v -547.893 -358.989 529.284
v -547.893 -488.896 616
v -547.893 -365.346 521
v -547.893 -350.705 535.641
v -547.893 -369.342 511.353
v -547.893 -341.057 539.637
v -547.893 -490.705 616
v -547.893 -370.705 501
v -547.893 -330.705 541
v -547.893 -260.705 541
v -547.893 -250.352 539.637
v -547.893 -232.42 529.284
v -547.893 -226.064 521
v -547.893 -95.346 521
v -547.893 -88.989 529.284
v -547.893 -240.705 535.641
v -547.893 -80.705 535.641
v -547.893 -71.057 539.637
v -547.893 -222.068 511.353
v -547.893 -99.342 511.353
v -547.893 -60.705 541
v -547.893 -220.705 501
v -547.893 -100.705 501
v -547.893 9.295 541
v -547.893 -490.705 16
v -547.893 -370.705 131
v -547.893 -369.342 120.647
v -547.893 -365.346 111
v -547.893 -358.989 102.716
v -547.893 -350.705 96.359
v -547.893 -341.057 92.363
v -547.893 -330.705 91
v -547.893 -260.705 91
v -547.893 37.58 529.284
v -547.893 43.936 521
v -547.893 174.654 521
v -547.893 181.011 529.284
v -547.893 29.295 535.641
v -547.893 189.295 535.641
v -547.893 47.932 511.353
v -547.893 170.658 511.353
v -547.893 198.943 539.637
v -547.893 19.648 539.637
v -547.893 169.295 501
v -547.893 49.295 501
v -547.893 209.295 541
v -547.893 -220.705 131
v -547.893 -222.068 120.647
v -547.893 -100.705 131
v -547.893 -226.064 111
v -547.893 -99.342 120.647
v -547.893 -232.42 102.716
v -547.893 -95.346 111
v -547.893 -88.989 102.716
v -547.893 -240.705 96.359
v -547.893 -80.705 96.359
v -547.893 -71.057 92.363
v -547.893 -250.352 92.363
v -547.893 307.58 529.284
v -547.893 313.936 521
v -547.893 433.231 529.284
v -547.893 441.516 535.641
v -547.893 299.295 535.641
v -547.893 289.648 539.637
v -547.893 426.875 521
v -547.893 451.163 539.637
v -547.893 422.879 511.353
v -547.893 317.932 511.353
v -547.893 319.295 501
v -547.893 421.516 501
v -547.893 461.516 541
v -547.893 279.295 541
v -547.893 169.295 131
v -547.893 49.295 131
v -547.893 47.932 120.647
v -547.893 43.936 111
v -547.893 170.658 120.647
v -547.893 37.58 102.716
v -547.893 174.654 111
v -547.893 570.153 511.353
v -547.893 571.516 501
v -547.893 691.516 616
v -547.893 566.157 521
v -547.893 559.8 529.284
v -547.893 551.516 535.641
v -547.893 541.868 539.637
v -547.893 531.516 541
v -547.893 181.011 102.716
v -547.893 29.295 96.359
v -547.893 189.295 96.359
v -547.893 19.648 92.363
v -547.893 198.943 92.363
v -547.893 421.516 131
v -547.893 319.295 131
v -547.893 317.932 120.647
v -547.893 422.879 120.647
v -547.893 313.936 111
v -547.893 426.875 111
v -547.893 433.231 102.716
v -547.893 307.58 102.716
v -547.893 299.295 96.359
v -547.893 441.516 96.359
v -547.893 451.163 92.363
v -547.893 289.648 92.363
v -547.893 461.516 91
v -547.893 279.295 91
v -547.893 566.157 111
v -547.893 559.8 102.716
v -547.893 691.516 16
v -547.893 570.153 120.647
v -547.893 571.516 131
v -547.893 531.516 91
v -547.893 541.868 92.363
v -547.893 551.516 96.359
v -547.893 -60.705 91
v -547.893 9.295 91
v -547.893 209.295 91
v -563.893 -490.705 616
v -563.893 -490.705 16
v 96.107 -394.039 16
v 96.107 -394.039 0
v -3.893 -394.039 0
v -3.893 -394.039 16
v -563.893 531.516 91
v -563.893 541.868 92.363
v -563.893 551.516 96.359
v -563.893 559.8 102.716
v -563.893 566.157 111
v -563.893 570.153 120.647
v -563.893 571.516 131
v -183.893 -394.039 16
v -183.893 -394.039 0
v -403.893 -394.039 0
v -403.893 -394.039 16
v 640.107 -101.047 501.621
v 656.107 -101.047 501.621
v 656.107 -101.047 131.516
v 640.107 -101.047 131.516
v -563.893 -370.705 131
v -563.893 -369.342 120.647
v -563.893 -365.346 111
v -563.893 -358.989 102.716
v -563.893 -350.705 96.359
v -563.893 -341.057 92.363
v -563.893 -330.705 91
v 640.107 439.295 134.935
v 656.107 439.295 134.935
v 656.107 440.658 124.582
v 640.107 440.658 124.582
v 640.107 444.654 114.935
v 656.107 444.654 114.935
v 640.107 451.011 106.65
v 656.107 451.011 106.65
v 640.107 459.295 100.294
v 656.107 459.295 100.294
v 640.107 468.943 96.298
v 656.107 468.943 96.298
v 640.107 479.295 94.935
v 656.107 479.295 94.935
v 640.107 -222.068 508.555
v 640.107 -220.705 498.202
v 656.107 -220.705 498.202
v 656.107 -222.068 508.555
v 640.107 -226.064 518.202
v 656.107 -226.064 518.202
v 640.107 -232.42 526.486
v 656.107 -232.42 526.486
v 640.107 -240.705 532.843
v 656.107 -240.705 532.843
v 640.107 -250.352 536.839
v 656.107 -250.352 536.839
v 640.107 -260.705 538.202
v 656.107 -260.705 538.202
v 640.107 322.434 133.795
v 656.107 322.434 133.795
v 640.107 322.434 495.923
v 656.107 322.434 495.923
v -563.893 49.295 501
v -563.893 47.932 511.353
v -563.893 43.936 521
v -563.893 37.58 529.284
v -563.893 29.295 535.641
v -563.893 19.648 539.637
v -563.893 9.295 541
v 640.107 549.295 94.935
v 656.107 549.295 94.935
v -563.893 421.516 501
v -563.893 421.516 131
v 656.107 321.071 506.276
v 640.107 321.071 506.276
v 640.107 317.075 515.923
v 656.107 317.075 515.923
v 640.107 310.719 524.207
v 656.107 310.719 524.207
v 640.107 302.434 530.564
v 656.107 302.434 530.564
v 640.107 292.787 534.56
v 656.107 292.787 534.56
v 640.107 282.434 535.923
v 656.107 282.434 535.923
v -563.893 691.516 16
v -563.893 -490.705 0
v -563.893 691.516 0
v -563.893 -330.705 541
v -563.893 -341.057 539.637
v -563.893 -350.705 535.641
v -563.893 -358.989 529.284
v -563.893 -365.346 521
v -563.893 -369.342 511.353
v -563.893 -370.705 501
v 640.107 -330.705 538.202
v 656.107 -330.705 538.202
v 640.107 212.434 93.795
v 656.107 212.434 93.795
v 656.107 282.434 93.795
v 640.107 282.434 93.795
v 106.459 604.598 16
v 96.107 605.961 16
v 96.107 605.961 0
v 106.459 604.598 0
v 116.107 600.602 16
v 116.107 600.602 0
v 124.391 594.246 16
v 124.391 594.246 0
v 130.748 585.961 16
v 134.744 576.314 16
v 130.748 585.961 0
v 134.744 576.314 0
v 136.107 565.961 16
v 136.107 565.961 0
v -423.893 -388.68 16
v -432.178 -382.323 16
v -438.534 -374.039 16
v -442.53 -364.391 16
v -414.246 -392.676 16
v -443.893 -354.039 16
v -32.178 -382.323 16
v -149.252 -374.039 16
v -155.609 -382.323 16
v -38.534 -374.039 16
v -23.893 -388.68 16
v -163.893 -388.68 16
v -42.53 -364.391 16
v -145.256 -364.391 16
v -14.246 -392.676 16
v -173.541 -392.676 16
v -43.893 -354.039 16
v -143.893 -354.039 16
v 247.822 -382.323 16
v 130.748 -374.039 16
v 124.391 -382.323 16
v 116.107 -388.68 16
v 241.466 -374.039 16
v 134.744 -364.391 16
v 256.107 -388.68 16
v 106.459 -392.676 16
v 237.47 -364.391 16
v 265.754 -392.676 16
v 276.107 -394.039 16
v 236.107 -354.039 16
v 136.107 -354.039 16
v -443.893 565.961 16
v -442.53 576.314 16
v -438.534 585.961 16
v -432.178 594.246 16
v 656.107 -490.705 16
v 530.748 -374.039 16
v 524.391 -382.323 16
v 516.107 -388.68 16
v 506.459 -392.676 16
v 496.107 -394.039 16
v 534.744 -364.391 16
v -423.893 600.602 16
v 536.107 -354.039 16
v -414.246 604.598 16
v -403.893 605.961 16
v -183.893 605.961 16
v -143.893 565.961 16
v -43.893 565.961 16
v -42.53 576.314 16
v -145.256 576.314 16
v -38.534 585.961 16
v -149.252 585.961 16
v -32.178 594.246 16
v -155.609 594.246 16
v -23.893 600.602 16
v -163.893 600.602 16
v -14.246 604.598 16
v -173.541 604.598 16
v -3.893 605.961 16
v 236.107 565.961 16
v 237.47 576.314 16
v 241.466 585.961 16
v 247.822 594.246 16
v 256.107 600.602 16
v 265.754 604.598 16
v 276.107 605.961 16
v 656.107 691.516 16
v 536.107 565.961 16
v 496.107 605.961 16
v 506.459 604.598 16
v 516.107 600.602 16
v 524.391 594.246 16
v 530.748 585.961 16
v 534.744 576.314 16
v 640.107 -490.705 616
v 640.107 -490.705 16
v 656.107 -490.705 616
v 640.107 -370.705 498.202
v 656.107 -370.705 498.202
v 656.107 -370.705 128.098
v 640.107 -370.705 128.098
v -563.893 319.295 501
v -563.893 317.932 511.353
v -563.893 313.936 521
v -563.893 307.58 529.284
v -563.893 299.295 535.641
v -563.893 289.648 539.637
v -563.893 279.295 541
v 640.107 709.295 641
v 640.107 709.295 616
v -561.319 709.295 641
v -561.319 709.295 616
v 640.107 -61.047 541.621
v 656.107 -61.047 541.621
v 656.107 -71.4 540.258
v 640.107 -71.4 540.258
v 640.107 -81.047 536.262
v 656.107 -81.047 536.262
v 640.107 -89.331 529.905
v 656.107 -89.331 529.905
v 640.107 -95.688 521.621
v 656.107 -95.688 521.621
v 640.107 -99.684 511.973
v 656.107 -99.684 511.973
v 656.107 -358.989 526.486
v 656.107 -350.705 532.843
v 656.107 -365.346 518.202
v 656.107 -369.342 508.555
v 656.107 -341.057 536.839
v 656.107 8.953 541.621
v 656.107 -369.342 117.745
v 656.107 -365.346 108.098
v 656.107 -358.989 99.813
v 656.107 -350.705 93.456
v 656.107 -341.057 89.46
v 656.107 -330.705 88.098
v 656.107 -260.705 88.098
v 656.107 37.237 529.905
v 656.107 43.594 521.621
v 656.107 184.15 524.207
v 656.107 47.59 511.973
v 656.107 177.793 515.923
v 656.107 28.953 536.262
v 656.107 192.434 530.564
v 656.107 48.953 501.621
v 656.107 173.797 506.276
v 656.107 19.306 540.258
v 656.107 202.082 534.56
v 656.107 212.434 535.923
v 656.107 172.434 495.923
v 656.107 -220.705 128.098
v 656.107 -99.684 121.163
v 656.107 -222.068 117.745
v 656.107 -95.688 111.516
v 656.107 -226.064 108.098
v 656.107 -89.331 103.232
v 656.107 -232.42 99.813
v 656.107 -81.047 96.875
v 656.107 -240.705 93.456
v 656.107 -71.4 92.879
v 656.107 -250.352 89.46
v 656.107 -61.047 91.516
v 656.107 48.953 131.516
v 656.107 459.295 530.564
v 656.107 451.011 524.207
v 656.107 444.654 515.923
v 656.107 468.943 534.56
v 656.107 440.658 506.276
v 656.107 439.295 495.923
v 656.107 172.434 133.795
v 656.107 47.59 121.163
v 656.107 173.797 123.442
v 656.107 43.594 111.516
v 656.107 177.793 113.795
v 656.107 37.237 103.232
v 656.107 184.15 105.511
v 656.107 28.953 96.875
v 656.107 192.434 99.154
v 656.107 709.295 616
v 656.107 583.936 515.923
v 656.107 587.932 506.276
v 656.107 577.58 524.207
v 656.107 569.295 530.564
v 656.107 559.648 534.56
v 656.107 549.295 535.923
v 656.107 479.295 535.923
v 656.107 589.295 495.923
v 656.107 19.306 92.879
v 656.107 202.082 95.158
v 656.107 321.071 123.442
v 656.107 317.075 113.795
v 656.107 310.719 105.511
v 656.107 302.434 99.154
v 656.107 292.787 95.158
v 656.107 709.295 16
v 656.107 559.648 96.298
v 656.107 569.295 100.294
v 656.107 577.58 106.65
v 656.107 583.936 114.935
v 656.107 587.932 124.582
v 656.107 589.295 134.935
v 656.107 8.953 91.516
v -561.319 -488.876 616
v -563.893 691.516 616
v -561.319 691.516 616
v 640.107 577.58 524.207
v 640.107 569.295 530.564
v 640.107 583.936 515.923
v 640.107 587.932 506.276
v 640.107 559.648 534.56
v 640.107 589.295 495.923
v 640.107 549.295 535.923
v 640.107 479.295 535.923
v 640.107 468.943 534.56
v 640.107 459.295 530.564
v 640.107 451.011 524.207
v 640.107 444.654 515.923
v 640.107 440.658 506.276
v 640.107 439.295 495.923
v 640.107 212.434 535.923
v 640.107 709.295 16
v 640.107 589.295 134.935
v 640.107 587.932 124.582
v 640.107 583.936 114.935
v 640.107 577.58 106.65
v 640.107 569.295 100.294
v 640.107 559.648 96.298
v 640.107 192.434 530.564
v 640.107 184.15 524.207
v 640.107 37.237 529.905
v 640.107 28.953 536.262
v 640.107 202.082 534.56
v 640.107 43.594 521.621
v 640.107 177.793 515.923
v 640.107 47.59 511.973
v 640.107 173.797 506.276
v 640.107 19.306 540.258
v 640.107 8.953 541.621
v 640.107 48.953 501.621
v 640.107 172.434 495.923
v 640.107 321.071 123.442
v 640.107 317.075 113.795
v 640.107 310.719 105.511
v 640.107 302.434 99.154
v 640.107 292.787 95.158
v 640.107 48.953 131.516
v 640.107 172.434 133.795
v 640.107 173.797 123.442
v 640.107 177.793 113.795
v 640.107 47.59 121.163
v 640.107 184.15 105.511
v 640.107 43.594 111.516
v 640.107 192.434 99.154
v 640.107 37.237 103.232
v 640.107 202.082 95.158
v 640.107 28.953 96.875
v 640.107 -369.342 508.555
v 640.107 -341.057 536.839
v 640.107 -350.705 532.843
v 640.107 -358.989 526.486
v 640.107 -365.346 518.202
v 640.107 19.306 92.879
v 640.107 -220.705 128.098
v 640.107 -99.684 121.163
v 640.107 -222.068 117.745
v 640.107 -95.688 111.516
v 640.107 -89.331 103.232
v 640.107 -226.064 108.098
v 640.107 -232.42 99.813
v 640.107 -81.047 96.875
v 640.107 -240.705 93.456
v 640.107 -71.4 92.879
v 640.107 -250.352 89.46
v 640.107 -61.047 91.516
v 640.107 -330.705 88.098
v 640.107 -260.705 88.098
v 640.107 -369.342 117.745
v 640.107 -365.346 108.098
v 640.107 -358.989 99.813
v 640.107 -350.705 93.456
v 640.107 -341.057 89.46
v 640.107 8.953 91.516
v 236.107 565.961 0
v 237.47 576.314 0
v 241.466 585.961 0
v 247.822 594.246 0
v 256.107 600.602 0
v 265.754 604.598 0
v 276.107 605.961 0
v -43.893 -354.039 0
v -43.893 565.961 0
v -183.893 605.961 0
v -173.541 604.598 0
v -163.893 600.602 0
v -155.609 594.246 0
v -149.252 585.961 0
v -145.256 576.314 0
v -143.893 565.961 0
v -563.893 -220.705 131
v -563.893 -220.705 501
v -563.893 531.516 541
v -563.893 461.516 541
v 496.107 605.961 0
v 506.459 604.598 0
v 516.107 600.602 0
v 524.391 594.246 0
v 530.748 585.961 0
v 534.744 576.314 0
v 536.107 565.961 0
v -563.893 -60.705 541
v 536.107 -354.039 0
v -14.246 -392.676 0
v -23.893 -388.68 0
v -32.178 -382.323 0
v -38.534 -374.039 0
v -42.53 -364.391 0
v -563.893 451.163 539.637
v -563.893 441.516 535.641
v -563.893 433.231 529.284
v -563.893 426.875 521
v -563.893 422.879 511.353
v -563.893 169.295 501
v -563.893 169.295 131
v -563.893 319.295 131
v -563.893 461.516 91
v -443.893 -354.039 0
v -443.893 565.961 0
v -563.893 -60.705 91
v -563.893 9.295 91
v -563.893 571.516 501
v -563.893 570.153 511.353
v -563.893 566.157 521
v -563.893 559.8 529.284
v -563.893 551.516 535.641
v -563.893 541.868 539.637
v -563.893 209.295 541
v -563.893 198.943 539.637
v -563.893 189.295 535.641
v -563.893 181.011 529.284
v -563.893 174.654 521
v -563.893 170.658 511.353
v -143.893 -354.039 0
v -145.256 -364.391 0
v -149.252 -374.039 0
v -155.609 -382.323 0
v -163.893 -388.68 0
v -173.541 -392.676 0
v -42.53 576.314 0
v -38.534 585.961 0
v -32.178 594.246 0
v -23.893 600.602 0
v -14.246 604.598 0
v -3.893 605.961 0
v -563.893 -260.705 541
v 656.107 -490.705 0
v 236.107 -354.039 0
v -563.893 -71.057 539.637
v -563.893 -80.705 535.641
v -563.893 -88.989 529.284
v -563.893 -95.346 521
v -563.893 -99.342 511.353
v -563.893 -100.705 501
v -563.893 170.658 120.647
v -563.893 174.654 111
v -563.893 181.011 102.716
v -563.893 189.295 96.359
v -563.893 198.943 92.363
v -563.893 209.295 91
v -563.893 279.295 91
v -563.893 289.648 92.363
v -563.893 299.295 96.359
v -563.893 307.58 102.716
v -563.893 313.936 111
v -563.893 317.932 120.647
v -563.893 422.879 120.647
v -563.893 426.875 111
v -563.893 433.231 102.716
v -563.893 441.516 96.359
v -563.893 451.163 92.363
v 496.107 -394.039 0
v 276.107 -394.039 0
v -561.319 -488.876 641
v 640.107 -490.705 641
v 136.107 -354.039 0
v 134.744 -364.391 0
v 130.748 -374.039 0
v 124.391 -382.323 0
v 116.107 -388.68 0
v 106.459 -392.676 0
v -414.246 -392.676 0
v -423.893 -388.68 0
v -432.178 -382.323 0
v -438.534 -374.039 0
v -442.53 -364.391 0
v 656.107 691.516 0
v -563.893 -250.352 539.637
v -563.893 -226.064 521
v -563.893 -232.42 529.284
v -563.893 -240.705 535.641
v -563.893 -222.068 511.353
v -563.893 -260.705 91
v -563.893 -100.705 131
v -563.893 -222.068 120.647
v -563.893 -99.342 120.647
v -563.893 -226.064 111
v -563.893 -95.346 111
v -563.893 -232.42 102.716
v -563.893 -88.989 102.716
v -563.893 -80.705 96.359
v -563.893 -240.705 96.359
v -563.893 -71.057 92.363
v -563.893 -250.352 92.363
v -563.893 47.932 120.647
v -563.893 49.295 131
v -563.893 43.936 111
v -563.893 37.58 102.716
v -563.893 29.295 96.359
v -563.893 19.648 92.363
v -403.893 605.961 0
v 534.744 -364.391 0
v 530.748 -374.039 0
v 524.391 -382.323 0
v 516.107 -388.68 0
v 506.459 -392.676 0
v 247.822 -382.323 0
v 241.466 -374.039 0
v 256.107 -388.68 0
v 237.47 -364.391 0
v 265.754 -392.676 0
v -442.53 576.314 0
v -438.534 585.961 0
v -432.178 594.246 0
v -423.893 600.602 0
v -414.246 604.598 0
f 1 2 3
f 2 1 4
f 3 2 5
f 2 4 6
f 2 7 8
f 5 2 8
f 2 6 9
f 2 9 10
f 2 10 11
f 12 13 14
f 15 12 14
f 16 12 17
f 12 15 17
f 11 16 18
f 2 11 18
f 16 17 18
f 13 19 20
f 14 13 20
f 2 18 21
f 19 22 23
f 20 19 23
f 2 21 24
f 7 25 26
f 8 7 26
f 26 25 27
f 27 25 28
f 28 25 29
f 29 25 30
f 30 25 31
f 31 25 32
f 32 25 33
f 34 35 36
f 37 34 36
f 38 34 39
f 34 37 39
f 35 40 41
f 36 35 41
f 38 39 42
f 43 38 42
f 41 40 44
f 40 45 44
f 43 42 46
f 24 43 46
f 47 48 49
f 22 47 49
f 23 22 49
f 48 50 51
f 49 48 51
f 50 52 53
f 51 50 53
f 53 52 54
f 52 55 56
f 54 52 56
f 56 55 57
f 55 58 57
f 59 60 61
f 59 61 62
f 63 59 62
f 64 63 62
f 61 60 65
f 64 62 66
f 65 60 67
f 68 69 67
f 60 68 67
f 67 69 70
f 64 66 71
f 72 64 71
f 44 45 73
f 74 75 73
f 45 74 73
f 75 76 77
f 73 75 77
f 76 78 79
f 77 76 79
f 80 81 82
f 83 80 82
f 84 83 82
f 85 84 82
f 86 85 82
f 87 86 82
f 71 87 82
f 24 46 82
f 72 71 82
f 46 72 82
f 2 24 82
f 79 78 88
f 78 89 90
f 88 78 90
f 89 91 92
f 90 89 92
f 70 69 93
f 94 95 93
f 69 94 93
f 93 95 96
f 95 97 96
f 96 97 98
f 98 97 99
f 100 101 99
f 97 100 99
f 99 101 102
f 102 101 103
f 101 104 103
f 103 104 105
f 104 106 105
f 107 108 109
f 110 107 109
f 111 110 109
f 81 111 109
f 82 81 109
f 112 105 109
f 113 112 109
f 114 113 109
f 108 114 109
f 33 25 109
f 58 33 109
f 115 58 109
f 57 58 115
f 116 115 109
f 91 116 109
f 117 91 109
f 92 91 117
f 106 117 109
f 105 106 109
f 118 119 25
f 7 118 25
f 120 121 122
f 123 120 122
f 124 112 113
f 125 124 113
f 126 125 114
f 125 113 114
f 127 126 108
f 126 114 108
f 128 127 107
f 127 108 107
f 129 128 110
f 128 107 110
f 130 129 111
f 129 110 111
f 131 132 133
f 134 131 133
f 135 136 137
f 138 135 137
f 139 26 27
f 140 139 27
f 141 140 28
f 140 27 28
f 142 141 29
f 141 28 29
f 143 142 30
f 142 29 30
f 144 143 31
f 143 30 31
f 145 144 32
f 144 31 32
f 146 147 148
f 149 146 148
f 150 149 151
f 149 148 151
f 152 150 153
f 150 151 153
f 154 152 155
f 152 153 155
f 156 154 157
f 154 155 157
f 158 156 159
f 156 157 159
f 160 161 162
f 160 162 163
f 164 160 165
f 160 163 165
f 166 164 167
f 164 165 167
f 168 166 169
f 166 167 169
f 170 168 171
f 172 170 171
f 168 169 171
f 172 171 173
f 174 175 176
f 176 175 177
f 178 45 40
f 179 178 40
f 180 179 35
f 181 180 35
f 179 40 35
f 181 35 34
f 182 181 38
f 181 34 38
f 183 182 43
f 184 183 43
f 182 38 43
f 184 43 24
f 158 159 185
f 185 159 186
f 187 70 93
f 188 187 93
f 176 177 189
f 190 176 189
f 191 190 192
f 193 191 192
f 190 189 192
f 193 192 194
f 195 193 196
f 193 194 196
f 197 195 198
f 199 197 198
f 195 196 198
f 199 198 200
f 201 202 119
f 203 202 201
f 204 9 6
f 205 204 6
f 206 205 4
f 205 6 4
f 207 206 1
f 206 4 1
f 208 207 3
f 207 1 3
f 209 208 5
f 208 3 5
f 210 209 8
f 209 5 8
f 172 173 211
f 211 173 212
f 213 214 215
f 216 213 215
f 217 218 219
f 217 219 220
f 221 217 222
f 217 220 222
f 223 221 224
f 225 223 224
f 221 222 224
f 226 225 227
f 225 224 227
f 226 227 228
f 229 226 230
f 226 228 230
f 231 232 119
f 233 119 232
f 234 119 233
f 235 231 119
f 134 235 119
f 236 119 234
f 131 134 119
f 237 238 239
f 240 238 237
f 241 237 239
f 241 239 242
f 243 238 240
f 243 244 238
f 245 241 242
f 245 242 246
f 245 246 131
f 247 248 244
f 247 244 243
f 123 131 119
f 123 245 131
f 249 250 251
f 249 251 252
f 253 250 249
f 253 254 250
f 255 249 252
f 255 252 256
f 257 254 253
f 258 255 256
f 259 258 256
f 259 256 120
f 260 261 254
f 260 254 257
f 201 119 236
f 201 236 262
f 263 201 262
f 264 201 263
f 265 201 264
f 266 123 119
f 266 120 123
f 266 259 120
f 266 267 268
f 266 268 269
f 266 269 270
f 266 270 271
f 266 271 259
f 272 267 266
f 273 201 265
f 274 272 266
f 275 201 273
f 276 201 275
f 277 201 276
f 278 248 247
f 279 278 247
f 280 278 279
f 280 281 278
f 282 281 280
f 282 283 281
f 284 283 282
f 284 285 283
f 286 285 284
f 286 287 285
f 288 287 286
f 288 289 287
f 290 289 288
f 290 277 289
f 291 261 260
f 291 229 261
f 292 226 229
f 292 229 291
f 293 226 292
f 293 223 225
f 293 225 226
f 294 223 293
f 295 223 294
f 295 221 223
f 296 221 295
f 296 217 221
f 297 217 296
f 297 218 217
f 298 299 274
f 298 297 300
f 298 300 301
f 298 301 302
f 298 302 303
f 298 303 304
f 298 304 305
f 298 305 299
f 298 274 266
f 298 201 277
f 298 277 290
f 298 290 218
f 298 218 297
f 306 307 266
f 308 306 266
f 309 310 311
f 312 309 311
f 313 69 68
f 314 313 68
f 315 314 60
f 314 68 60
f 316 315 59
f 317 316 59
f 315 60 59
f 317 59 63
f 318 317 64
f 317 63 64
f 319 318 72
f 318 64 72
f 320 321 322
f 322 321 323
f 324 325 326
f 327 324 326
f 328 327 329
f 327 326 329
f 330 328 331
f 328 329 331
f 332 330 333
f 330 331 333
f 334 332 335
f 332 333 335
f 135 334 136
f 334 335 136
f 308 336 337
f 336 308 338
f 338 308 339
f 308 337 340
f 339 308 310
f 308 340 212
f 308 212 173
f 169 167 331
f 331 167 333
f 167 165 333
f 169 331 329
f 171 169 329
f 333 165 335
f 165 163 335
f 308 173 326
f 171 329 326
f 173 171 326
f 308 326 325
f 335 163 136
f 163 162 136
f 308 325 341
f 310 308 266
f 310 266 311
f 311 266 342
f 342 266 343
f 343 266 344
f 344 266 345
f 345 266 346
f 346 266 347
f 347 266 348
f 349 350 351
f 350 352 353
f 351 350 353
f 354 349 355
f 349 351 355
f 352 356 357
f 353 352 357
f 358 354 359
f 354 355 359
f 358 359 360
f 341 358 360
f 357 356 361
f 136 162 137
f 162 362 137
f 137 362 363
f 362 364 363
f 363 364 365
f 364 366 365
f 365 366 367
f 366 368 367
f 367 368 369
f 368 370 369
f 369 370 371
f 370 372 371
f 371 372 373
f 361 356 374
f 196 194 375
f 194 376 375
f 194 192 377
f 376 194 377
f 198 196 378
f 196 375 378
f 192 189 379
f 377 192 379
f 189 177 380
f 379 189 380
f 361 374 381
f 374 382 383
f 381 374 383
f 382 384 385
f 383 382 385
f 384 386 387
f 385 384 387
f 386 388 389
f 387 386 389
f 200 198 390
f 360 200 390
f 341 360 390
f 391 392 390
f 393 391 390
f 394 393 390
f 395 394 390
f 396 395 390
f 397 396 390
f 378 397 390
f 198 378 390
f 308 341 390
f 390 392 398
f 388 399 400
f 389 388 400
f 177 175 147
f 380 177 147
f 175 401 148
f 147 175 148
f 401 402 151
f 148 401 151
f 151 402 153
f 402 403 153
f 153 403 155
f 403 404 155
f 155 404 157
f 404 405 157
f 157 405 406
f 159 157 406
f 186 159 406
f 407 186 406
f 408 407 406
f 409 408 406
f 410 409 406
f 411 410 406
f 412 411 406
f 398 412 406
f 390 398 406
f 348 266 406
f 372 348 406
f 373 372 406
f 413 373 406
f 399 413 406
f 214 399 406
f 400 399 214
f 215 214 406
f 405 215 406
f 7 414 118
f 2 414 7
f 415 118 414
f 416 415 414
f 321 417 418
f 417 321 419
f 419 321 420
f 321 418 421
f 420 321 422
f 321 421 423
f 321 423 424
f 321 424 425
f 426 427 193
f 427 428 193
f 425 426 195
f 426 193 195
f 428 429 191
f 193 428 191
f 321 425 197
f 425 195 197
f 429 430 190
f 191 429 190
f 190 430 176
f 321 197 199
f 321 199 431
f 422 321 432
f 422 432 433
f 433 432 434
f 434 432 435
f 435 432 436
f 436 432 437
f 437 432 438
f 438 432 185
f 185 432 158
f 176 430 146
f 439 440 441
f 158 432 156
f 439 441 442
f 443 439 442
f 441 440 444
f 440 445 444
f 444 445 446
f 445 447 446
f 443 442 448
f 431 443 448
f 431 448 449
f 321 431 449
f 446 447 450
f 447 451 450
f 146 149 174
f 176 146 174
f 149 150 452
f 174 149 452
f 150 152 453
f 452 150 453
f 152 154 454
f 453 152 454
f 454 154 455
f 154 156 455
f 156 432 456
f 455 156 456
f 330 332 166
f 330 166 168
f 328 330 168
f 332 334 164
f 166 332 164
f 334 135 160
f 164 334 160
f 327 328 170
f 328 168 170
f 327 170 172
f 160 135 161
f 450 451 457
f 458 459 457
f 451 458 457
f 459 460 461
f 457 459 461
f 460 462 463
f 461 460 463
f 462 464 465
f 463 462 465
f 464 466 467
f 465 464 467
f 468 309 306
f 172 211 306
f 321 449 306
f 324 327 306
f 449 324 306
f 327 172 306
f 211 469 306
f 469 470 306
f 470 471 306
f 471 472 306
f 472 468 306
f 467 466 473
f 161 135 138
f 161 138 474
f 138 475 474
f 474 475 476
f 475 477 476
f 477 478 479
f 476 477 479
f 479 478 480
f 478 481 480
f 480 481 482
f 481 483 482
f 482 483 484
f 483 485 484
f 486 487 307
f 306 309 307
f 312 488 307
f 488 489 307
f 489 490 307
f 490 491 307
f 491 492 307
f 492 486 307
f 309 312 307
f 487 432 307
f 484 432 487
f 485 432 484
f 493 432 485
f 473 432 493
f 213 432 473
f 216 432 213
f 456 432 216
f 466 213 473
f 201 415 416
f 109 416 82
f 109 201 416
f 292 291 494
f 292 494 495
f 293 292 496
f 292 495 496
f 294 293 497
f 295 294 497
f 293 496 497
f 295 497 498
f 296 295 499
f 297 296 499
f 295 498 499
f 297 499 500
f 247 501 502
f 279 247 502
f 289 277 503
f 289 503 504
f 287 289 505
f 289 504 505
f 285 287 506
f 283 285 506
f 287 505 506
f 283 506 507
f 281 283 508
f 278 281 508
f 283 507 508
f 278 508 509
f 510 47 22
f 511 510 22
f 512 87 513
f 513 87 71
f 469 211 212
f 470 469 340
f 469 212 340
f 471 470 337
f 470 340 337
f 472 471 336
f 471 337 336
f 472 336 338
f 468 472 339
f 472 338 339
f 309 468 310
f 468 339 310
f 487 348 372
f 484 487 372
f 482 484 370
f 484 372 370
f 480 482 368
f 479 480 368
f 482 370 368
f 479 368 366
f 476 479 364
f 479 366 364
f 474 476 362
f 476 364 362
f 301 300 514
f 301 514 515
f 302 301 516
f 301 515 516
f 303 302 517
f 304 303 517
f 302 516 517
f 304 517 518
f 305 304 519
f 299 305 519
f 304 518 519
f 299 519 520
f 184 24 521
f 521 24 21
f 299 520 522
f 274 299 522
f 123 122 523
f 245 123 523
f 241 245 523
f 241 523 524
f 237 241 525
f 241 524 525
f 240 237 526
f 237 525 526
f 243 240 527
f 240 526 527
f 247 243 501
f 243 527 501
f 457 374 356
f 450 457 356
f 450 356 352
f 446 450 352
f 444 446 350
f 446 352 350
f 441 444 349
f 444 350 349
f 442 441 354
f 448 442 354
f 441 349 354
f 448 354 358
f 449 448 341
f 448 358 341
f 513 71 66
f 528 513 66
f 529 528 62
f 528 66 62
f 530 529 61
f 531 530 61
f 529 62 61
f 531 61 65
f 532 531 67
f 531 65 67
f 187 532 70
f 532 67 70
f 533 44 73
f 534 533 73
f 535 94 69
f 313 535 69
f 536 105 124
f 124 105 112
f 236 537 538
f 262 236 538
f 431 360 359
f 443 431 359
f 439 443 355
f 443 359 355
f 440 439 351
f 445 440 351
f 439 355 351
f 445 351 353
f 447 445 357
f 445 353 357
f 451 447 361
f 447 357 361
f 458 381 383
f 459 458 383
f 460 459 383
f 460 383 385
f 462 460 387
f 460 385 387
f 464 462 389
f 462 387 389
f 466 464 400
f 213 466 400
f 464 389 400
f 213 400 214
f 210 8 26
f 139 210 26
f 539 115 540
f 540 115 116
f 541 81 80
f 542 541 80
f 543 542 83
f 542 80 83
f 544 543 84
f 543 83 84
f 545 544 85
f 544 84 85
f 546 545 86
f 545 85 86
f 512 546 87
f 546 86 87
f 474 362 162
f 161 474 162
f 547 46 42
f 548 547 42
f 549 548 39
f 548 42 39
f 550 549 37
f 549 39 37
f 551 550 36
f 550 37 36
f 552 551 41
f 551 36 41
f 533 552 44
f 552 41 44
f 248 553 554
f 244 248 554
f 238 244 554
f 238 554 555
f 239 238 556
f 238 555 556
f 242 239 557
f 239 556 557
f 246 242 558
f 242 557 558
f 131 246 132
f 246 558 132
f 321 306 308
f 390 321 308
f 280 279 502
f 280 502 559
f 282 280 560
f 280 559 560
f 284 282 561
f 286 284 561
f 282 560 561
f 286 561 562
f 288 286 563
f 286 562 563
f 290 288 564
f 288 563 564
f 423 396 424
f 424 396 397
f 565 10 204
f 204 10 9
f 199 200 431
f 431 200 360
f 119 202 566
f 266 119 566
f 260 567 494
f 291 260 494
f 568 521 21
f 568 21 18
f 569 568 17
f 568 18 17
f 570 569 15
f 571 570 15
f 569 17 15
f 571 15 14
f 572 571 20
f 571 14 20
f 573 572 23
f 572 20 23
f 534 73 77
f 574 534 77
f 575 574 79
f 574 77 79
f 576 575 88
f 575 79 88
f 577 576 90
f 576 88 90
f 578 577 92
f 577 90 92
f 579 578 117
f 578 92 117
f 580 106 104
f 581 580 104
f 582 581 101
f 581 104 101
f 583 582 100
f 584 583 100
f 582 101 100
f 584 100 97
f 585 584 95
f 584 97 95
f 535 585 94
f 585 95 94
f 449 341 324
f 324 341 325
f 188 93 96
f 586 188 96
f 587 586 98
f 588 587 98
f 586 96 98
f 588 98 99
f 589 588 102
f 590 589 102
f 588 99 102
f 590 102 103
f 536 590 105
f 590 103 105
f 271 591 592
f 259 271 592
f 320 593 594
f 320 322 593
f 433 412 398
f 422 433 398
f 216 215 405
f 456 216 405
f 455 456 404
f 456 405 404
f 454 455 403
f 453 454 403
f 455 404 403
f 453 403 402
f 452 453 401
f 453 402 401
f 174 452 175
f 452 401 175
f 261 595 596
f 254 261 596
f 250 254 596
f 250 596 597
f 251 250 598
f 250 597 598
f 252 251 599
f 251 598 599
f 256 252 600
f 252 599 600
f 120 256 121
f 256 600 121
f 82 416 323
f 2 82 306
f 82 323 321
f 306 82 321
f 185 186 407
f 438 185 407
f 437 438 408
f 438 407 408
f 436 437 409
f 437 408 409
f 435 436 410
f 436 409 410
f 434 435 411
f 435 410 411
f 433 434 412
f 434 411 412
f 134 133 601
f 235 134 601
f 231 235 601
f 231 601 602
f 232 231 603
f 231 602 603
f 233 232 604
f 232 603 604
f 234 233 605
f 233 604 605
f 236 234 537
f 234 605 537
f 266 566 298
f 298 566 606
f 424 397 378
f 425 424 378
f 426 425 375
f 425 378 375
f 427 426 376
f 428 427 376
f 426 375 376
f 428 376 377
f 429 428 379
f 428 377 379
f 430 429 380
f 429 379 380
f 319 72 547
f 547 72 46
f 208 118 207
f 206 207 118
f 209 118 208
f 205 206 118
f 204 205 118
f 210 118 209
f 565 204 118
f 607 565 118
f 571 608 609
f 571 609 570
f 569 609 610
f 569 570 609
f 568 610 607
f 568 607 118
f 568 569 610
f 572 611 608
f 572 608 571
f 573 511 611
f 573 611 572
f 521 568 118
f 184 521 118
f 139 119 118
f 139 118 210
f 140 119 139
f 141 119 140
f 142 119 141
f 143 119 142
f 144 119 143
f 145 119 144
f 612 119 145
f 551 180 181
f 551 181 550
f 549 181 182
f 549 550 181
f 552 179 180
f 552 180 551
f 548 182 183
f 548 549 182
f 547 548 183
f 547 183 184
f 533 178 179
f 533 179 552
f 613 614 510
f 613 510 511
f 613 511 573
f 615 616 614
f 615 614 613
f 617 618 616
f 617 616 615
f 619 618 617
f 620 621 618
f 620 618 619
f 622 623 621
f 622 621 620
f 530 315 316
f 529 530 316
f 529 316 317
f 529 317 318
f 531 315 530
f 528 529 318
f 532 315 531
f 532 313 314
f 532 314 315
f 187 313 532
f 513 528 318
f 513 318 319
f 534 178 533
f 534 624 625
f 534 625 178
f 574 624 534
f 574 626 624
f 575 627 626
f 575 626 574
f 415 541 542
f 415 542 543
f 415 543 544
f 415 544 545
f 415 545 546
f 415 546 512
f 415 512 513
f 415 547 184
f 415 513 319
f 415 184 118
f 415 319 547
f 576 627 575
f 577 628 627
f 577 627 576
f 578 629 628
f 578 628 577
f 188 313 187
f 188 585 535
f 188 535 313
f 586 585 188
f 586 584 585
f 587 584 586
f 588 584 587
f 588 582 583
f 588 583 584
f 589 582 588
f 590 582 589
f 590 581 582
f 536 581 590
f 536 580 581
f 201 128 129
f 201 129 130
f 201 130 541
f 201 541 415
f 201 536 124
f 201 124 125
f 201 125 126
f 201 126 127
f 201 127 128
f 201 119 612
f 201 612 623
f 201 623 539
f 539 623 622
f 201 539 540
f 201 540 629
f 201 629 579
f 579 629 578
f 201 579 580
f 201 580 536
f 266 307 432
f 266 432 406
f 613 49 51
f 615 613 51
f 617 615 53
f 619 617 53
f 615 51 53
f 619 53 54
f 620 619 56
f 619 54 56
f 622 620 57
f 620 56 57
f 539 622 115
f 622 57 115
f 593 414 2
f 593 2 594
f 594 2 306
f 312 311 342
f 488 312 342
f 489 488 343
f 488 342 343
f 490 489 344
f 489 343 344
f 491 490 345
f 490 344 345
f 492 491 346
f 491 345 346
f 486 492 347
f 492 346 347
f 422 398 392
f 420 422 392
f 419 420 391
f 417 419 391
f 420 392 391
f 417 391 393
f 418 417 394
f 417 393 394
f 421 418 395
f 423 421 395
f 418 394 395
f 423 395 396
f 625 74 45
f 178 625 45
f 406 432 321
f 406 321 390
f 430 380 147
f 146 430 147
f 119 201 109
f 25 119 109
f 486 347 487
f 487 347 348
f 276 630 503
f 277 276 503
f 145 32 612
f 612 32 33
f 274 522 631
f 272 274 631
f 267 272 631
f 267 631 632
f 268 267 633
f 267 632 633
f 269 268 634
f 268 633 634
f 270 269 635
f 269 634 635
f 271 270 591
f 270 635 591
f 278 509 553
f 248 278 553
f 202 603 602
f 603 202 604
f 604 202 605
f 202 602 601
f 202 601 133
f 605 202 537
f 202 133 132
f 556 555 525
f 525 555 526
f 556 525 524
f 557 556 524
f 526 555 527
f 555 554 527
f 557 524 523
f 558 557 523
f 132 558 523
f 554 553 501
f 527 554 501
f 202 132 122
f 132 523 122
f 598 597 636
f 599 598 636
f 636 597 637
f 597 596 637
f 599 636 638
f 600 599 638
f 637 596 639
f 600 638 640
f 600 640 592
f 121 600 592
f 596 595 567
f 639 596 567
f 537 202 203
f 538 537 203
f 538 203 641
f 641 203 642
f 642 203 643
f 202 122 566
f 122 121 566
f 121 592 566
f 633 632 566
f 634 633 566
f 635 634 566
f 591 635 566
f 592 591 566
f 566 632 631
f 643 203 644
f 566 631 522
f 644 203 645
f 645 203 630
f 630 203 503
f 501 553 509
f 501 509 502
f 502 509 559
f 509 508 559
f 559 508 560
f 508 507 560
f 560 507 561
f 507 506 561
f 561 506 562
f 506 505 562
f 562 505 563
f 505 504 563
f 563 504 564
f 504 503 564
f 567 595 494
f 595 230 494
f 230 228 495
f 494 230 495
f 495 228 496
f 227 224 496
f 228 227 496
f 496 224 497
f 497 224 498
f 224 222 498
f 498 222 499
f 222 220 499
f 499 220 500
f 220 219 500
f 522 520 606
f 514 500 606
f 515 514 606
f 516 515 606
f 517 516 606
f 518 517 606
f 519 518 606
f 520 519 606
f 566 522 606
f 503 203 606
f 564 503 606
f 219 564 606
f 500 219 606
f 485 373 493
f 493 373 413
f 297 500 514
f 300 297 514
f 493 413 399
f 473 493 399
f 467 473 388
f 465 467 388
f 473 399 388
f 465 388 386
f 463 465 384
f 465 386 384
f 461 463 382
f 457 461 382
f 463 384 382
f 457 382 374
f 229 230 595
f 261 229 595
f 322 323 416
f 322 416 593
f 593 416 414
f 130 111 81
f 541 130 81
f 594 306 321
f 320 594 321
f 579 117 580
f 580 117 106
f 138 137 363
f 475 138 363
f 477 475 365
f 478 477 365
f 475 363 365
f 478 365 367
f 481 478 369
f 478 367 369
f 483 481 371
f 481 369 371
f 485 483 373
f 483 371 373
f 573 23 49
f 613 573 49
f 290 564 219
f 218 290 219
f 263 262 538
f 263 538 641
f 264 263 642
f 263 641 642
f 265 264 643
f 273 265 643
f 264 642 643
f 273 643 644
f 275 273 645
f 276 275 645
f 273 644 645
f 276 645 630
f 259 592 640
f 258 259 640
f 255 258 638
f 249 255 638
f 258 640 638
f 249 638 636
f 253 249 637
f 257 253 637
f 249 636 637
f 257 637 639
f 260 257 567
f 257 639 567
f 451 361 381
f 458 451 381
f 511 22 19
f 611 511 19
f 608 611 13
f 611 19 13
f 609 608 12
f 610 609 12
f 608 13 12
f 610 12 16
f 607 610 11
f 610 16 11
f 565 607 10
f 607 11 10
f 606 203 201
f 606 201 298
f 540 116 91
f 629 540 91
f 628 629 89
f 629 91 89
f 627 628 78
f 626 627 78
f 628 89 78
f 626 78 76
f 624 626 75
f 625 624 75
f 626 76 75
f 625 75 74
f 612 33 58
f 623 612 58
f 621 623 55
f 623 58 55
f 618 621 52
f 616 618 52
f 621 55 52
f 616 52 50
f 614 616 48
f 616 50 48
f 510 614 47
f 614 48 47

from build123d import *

# Parameters (mm, degrees)
F2_W      = 1220
F2_H      = 1182.220281
F3_DEPTH  = 16
F4_W      = 16
F4_H      = 1182.220281
F5_DEPTH  = 600
F7_DEPTH  = 16
F8_W      = 16
F8_H      = 1200
F8_H_2    = 1182.220281
F9_DEPTH  = 600
F11_DEPTH = 16
F13_DEPTH = 25


with BuildPart() as f3:
    # F2 (on face) → F3 (new body)
    with BuildSketch(Plane.XY):
        with Locations((46.106624, 100.405485)):
            Rectangle(F2_W, F2_H)
        with BuildLine():
            Line((-443.893376, -354.038735), (-443.893376, 565.961265))
            ThreePointArc((-443.893376, 565.961265), (-432.177647, 594.245536), (-403.893376, 605.961265))
            Line((-403.893376, 605.961265), (-183.893376, 605.961265))
            ThreePointArc((-183.893376, 605.961265), (-155.609105, 594.245536), (-143.893376, 565.961265))
            Line((-143.893376, 565.961265), (-143.893376, -354.038735))
            ThreePointArc((-143.893376, -354.038735), (-155.609105, -382.323006), (-183.893376, -394.038735))
            Line((-183.893376, -394.038735), (-403.893376, -394.038735))
            ThreePointArc((-403.893376, -394.038735), (-432.177647, -382.323006), (-443.893376, -354.038735))
        make_face(mode=Mode.SUBTRACT)
        with BuildLine():
            Line((-43.893376, -354.038735), (-43.893376, 565.961265))
            ThreePointArc((-43.893376, 565.961265), (-32.177647, 594.245536), (-3.893376, 605.961265))
            Line((-3.893376, 605.961265), (96.106624, 605.961265))
            ThreePointArc((96.106624, 605.961265), (124.390895, 594.245536), (136.106624, 565.961265))
            Line((136.106624, 565.961265), (136.106624, -354.038735))
            ThreePointArc((136.106624, -354.038735), (124.390895, -382.323006), (96.106624, -394.038735))
            Line((96.106624, -394.038735), (-3.893376, -394.038735))
            ThreePointArc((-3.893376, -394.038735), (-32.177647, -382.323006), (-43.893376, -354.038735))
        make_face(mode=Mode.SUBTRACT)
        with BuildLine():
            ThreePointArc((536.106624, -354.038735), (524.390895, -382.323006), (496.106624, -394.038735))
            Line((496.106624, -394.038735), (276.106624, -394.038735))
            ThreePointArc((276.106624, -394.038735), (247.822353, -382.323006), (236.106624, -354.038735))
            Line((236.106624, -354.038735), (236.106624, 565.961265))
            ThreePointArc((236.106624, 565.961265), (247.822353, 594.245536), (276.106624, 605.961265))
            Line((276.106624, 605.961265), (496.106624, 605.961265))
            ThreePointArc((496.106624, 605.961265), (524.390895, 594.245536), (536.106624, 565.961265))
            Line((536.106624, 565.961265), (536.106624, -354.038735))
        make_face(mode=Mode.SUBTRACT)
    extrude(amount=F3_DEPTH)


with BuildPart() as f5:
    # F4 (on face) → F5 (new body)
    with BuildSketch(Plane.XY.offset(16)):
        with Locations((-555.893376, 100.405485)):
            Rectangle(F4_W, F4_H)
    extrude(amount=F5_DEPTH)

    # F6 (on face) → F7 (cut)
    with BuildSketch(Plane.YZ.offset(-547.893376)):
        with BuildLine():
            ThreePointArc((-100.704656, 131), (-88.988927, 102.715729), (-60.704656, 91))
            Line((-60.704656, 91), (9.295344, 91))
            ThreePointArc((9.295344, 91), (37.579616, 102.715729), (49.295344, 131))
            Line((49.295344, 131), (49.295344, 501))
            ThreePointArc((49.295344, 501), (37.579616, 529.284271), (9.295344, 541))
            Line((9.295344, 541), (-60.704656, 541))
            ThreePointArc((-60.704656, 541), (-88.988927, 529.284271), (-100.704656, 501))
            Line((-100.704656, 501), (-100.704656, 131))
        make_face()
        with BuildLine():
            ThreePointArc((421.515625, 131), (433.231353, 102.715729), (461.515625, 91))
            Line((461.515625, 91), (531.515625, 91))
            ThreePointArc((531.515625, 91), (559.799896, 102.715729), (571.515625, 131))
            Line((571.515625, 131), (571.515625, 501))
            ThreePointArc((571.515625, 501), (559.799896, 529.284271), (531.515625, 541))
            Line((531.515625, 541), (461.515625, 541))
            ThreePointArc((461.515625, 541), (433.231353, 529.284271), (421.515625, 501))
            Line((421.515625, 501), (421.515625, 131))
        make_face()
        with BuildLine():
            Line((279.295344, 541), (209.295344, 541))
            ThreePointArc((209.295344, 541), (181.011073, 529.284271), (169.295344, 501))
            Line((169.295344, 501), (169.295344, 131))
            ThreePointArc((169.295344, 131), (181.011073, 102.715729), (209.295344, 91))
            Line((209.295344, 91), (279.295344, 91))
            ThreePointArc((279.295344, 91), (307.579616, 102.715729), (319.295344, 131))
            Line((319.295344, 131), (319.295344, 501))
            ThreePointArc((319.295344, 501), (307.579616, 529.284271), (279.295344, 541))
        make_face()
        with BuildLine():
            Line((-260.704656, 541), (-330.704656, 541))
            ThreePointArc((-330.704656, 541), (-358.988927, 529.284271), (-370.704656, 501))
            Line((-370.704656, 501), (-370.704656, 131))
            ThreePointArc((-370.704656, 131), (-358.988927, 102.715729), (-330.704656, 91))
            Line((-330.704656, 91), (-260.704656, 91))
            ThreePointArc((-260.704656, 91), (-232.420384, 102.715729), (-220.704656, 131))
            Line((-220.704656, 131), (-220.704656, 501))
            ThreePointArc((-220.704656, 501), (-232.420384, 529.284271), (-260.704656, 541))
        make_face()
    extrude(amount=-F7_DEPTH, mode=Mode.SUBTRACT)



with BuildPart() as f9:
    # F8 (on face) → F9 (new body)
    with BuildSketch(Plane.XY.offset(16)):
        with Locations((648.106624, 109.295344)):
            Rectangle(F8_W, F8_H)
        with Locations((648.106624, 100.405485)):
            Rectangle(F8_W, F8_H_2)
    extrude(amount=F9_DEPTH)

    # F10 (on face) → F11 (cut)
    with BuildSketch(Plane.YZ.offset(656.106624)):
        with BuildLine():
            ThreePointArc((-101.046969, 131.516037), (-89.33124, 103.231766), (-61.046969, 91.516037))
            Line((-61.046969, 91.516037), (8.953031, 91.516037))
            ThreePointArc((8.953031, 91.516037), (37.237303, 103.231766), (48.953031, 131.516037))
            Line((48.953031, 131.516037), (48.953031, 501.620677))
            ThreePointArc((48.953031, 501.620677), (37.237303, 529.904948), (8.953031, 541.620677))
            Line((8.953031, 541.620677), (-61.046969, 541.620677))
            ThreePointArc((-61.046969, 541.620677), (-89.33124, 529.904948), (-101.046969, 501.620677))
            Line((-101.046969, 501.620677), (-101.046969, 131.516037))
        make_face()
        with BuildLine():
            ThreePointArc((172.43438, 133.795037), (184.150109, 105.510766), (212.43438, 93.795037))
            Line((212.43438, 93.795037), (282.43438, 93.795037))
            ThreePointArc((282.43438, 93.795037), (310.718652, 105.510766), (322.43438, 133.795037))
            Line((322.43438, 133.795037), (322.43438, 495.923147))
            ThreePointArc((322.43438, 495.923147), (310.718652, 524.207419), (282.43438, 535.923147))
            Line((282.43438, 535.923147), (212.43438, 535.923147))
            ThreePointArc((212.43438, 535.923147), (184.150109, 524.207419), (172.43438, 495.923147))
            Line((172.43438, 495.923147), (172.43438, 133.795037))
        make_face()
        with BuildLine():
            ThreePointArc((-370.704656, 128.097508), (-358.988927, 99.813237), (-330.704656, 88.097508))
            Line((-330.704656, 88.097508), (-260.704656, 88.097508))
            ThreePointArc((-260.704656, 88.097508), (-232.420384, 99.813237), (-220.704656, 128.097508))
            Line((-220.704656, 128.097508), (-220.704656, 498.202147))
            ThreePointArc((-220.704656, 498.202147), (-232.420384, 526.486418), (-260.704656, 538.202147))
            Line((-260.704656, 538.202147), (-330.704656, 538.202147))
            ThreePointArc((-330.704656, 538.202147), (-358.988927, 526.486418), (-370.704656, 498.202147))
            Line((-370.704656, 498.202147), (-370.704656, 128.097508))
        make_face()
        with BuildLine():
            ThreePointArc((439.295344, 134.934567), (451.011073, 106.650296), (479.295344, 94.934567))
            Line((479.295344, 94.934567), (549.295344, 94.934567))
            ThreePointArc((549.295344, 94.934567), (577.579616, 106.650296), (589.295344, 134.934567))
            Line((589.295344, 134.934567), (589.295344, 495.923147))
            ThreePointArc((589.295344, 495.923147), (577.579616, 524.207419), (549.295344, 535.923147))
            Line((549.295344, 535.923147), (479.295344, 535.923147))
            ThreePointArc((479.295344, 535.923147), (451.011073, 524.207419), (439.295344, 495.923147))
            Line((439.295344, 495.923147), (439.295344, 134.934567))
        make_face()
    extrude(amount=-F11_DEPTH, mode=Mode.SUBTRACT)


with BuildPart() as f5_1:
    add(f5.part)

    add(f9.part)  # F13 merges F9
    # F12 (on face) → F13 (join)
    with BuildSketch(Plane.XY.offset(616)):
        Polygon((-561.31947, -488.875598), (640.106624, -490.704656), (640.106624, 709.295344), (-561.31947, 709.295344), align=None)
    extrude(amount=F13_DEPTH)


solid = Compound([f3.part, f5_1.part])
